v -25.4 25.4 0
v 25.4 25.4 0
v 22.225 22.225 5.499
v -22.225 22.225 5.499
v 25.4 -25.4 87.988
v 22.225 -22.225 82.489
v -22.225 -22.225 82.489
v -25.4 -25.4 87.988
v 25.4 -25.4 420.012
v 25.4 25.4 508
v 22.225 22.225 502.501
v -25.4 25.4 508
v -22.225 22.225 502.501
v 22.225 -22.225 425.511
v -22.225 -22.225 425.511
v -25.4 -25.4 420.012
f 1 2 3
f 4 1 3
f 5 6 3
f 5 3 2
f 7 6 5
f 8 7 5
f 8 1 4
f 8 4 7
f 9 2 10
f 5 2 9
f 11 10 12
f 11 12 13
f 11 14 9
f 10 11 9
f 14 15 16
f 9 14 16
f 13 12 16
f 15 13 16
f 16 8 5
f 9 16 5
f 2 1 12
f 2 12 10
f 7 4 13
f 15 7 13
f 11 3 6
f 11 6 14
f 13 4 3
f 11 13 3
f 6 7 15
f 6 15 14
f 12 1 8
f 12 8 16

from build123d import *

# Parameters (mm, degrees)
SKETCH1_W           = 50.8
SKETCH1_H           = 50.8
SKETCH1_W_2         = 44.45
SKETCH1_H_2         = 44.45
BOSS_EXTRUDE1_DEPTH = 508
CUT_EXTRUDE1_DEPTH  = 512.165139656


with BuildPart() as part:
    # Sketch1 → Boss-Extrude1 (new body)
    with BuildSketch(Plane.XY):
        Rectangle(SKETCH1_W, SKETCH1_H)
        Rectangle(SKETCH1_W_2, SKETCH1_H_2, mode=Mode.SUBTRACT)
    extrude(amount=BOSS_EXTRUDE1_DEPTH)

    # Sketch2 → Cut-Extrude1 (cut, through all)
    with BuildSketch(Plane.ZY.offset(25.4)):
        Polygon((0, 25.4), (87.988181024, -25.4), (0, -25.4), align=None)
        Polygon((508, 25.4), (420.011818975, -25.4), (508, -25.4), align=None)
    extrude(amount=-CUT_EXTRUDE1_DEPTH, mode=Mode.SUBTRACT)


solid = part.part
